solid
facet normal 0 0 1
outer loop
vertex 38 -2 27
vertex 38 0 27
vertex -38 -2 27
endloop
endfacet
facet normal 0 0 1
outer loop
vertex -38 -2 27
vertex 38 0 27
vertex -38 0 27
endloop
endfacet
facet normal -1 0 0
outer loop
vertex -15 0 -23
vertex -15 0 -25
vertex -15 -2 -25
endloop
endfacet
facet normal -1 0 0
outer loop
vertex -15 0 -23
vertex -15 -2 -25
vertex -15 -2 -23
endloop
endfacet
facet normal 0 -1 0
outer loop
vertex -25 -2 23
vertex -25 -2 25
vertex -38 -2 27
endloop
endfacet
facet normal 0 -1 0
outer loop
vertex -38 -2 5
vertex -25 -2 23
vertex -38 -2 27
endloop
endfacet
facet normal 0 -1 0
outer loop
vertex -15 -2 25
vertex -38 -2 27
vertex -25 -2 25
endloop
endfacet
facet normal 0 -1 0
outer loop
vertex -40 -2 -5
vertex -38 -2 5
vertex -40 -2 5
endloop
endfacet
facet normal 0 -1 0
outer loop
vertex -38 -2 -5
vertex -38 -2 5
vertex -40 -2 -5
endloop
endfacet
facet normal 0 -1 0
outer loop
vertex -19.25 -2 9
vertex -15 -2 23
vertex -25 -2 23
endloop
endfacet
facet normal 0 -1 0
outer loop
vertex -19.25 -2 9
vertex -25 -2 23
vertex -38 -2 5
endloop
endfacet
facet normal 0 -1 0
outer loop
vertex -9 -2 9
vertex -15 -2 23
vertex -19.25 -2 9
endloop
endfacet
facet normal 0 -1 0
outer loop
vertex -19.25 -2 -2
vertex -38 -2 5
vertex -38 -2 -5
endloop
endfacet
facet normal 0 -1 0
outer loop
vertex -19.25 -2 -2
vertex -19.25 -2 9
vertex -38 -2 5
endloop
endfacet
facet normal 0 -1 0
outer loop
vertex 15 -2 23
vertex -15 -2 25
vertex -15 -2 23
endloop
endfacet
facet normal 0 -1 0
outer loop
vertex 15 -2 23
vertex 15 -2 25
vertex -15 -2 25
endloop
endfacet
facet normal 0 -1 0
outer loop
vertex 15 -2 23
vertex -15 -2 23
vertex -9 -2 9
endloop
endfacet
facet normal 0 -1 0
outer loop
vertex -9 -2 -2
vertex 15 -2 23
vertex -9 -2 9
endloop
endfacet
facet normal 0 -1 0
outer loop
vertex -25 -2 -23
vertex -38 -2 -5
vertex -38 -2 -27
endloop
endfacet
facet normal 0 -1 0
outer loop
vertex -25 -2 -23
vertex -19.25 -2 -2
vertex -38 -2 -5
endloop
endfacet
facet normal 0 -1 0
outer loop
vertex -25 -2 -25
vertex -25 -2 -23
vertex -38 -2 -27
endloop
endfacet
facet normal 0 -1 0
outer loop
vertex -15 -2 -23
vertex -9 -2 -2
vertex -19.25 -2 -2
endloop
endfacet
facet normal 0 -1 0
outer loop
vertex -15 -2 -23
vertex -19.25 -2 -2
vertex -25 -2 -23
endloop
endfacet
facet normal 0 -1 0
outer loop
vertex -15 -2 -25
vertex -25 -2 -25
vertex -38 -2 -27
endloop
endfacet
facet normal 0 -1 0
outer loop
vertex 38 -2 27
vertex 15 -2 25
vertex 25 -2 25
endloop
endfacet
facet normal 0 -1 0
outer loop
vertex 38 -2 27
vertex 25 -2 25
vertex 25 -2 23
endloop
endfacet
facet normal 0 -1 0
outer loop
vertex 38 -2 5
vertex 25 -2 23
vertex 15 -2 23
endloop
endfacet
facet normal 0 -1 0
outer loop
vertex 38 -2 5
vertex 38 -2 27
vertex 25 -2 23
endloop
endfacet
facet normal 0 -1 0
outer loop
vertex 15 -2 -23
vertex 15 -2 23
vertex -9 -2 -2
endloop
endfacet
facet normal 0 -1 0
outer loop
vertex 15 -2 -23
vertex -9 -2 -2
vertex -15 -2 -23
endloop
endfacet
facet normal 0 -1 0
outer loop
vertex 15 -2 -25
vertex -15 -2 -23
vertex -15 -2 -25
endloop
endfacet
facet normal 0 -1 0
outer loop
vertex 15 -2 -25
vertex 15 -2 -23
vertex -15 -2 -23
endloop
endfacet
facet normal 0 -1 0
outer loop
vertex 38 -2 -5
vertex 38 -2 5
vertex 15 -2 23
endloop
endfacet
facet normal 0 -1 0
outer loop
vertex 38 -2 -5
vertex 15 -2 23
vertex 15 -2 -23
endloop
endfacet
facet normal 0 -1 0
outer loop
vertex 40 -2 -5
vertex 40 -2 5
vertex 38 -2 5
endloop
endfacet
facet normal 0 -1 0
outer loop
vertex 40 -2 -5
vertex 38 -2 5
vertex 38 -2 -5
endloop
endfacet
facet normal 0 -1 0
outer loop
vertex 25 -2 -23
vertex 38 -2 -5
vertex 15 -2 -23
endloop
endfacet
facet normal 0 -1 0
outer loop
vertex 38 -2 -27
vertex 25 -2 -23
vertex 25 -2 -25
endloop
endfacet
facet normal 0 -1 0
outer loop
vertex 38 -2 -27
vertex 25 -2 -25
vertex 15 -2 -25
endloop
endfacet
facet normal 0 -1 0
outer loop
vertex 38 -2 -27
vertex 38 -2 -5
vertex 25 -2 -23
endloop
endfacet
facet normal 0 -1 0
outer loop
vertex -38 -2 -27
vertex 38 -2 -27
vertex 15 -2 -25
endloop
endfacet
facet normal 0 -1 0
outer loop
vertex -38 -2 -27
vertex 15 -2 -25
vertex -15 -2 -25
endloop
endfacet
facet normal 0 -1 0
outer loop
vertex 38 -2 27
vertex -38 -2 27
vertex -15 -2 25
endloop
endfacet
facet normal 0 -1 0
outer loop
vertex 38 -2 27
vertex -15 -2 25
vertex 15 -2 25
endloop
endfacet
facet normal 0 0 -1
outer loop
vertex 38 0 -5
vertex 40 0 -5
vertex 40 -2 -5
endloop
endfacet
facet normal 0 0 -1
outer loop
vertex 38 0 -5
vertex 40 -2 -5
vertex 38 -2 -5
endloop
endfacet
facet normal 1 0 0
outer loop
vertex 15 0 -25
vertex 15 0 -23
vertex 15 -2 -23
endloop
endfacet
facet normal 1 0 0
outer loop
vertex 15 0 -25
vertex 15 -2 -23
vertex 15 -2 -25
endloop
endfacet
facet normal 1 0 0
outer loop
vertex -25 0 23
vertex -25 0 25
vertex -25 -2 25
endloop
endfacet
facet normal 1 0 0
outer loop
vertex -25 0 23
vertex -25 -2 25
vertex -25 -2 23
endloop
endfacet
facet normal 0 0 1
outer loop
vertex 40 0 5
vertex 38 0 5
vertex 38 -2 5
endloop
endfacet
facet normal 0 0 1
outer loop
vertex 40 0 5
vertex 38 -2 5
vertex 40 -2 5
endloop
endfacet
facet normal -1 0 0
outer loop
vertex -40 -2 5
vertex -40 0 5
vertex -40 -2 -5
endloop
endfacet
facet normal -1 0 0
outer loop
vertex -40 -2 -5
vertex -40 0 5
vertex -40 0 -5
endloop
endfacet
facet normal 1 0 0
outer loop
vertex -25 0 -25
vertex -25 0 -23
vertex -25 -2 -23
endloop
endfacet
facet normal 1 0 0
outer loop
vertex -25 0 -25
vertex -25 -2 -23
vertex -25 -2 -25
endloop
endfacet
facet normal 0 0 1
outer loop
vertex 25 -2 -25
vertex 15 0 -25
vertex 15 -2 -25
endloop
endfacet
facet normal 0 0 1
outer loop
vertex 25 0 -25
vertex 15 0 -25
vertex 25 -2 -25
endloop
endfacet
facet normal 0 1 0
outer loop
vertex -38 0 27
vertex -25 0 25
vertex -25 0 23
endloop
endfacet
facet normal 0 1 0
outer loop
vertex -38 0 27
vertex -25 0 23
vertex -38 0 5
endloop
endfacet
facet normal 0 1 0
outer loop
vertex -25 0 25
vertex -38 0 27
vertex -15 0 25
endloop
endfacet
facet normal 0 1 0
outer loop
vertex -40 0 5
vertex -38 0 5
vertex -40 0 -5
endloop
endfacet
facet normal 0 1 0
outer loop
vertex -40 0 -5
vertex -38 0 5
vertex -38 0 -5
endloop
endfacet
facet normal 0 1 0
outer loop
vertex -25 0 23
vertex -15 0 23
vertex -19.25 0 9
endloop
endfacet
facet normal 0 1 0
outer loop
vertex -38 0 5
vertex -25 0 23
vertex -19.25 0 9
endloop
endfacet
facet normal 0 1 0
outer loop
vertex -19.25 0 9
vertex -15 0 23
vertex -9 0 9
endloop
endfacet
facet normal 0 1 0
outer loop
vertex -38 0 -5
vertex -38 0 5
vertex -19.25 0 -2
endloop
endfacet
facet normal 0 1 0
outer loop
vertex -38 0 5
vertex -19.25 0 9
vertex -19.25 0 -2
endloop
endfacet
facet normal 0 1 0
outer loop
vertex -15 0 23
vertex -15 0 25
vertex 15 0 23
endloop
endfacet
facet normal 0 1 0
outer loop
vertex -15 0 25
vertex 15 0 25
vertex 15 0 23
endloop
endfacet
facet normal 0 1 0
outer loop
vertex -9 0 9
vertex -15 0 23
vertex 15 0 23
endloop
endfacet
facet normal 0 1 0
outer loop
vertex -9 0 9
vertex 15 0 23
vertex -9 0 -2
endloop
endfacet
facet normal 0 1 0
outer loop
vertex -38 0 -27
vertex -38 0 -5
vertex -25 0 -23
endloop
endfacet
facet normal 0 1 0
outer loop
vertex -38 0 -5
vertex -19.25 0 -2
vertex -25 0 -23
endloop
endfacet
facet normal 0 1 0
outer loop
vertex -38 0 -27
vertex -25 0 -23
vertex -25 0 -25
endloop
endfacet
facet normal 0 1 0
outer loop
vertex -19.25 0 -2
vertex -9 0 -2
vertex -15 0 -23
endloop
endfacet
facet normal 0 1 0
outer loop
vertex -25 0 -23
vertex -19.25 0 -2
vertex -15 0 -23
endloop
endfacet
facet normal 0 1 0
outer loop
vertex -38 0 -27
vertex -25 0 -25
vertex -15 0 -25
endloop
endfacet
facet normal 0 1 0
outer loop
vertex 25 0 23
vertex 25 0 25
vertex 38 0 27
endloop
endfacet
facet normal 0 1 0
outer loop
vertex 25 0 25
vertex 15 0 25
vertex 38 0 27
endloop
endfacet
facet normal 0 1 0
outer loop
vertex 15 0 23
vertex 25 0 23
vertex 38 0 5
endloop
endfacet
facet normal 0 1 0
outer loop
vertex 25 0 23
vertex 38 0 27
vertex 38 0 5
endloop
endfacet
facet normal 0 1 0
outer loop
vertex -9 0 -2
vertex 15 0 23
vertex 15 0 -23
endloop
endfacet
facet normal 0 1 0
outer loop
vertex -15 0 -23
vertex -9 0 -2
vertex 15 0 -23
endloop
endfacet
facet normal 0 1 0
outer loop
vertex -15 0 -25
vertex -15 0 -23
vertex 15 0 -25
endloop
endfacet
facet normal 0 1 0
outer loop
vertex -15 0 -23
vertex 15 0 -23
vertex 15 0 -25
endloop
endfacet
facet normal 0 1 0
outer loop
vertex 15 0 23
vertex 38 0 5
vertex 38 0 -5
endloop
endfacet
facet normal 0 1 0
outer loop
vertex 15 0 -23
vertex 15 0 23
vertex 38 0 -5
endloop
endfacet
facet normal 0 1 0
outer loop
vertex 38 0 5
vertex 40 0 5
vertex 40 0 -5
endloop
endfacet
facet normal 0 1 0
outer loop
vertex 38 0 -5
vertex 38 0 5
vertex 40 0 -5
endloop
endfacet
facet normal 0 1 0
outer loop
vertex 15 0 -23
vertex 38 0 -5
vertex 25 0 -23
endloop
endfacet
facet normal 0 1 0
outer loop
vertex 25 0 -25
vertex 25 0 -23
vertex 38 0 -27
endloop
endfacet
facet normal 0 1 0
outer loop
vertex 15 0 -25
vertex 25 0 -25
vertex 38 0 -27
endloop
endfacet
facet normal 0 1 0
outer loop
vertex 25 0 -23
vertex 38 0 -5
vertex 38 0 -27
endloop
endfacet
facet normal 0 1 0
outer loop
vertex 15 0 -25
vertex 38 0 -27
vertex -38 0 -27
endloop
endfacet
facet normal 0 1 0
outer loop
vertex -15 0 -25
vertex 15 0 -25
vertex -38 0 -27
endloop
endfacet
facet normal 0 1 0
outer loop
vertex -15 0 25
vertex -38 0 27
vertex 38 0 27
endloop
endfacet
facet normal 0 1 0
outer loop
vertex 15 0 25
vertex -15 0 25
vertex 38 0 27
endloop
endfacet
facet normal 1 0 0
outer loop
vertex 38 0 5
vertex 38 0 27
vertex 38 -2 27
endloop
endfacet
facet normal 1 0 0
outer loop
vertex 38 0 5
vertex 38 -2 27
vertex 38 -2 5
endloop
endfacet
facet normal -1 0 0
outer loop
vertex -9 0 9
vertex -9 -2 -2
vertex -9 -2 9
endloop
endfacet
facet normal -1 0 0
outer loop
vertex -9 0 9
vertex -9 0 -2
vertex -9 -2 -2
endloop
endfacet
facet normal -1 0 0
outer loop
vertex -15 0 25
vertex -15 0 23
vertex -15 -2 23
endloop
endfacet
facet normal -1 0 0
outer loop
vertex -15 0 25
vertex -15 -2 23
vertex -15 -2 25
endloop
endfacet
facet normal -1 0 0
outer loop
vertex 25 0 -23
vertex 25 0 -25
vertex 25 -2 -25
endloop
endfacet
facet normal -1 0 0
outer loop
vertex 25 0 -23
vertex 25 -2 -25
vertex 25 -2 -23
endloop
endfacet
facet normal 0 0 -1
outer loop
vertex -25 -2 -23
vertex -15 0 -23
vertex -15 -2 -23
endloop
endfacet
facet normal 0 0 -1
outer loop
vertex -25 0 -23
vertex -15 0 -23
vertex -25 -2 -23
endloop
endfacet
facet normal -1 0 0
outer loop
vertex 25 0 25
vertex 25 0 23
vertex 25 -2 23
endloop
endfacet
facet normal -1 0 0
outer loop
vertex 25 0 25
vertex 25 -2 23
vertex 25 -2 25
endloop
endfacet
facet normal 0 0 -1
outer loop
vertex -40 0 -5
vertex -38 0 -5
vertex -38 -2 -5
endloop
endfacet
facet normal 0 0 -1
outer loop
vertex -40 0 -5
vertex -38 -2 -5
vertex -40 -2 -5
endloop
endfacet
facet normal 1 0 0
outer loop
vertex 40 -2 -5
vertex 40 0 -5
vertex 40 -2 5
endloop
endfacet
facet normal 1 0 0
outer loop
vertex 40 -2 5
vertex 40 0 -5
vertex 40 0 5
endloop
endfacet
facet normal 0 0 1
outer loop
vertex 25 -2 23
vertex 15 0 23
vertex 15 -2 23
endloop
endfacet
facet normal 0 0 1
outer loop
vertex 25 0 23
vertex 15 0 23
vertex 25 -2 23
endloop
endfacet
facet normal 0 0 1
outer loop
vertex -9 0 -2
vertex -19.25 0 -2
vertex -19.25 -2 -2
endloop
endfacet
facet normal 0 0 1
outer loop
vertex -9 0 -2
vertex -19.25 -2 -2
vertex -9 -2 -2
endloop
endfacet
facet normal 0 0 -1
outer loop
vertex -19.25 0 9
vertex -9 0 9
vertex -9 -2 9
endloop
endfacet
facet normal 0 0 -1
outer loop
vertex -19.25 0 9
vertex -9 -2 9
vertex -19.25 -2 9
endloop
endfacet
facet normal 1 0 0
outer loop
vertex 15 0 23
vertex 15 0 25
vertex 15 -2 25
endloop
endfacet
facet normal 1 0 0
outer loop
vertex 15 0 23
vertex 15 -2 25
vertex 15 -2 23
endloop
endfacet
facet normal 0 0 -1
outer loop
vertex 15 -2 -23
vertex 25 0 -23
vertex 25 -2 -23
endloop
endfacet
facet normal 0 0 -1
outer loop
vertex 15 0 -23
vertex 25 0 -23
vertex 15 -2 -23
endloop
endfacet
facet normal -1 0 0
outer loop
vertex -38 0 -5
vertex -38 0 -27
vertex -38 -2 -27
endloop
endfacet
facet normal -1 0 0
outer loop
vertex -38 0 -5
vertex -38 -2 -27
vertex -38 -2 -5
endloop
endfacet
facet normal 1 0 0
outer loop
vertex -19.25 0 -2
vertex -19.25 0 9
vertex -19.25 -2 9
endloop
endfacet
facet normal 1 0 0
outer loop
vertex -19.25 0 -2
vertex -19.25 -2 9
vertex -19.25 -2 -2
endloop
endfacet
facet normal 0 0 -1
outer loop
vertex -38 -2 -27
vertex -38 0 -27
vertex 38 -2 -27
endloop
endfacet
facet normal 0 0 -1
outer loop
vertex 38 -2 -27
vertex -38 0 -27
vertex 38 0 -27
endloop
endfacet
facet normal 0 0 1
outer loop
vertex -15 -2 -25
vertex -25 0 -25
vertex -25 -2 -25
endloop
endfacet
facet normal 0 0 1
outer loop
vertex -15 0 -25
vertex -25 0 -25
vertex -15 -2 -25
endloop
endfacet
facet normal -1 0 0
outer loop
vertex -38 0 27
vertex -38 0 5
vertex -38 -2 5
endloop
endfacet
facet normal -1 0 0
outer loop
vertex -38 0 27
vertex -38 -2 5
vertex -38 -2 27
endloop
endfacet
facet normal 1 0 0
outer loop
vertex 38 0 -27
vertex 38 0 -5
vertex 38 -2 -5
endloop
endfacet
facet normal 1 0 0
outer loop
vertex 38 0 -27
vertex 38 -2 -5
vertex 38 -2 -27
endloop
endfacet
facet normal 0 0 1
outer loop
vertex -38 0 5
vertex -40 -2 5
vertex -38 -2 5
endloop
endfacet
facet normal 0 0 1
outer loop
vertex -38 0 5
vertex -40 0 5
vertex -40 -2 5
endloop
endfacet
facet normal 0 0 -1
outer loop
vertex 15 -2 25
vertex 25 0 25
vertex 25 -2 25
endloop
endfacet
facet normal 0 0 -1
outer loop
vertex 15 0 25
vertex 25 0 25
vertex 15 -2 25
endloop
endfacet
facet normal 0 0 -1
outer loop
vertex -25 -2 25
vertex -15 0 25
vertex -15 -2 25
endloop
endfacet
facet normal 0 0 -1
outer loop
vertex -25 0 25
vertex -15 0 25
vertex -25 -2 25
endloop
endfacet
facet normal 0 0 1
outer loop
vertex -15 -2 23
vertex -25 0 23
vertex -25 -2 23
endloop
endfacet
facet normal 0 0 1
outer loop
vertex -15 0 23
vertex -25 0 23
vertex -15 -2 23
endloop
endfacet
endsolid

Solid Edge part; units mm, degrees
sketch "Sketch1" plane through (0, 0, 0) normal (0, -1, 0) x (1, 0, 0)
  line L0 (40, -27) -> (40, 27)
  line L1 (40, 27) -> (-40, 27)
  line L2 (-40, 27) -> (-40, -27)
  line L3 (-40, -27) -> (40, -27)
extrude "Protrusion1" add sketch "Sketch1" along normal blind 2
sketch "Sketch2" plane through (0, 0, 0) normal (0, -1, 0) x (1, 0, 0)
  line L0 (-25, 23) -> (-15, 23)
  line L1 (-15, 23) -> (-15, 25)
  line L2 (-15, 25) -> (-25, 25)
  line L3 (-25, 25) -> (-25, 23)
extrude "ExtrudedCutout_1" cut sketch "Sketch2" along normal blind 2
sketch "Sketch3" plane through (0, 0, 0) normal (0, -1, 0) x (1, 0, 0)
  line L0 (25, 25) -> (15, 25)
  line L1 (15, 25) -> (15, 23)
  line L2 (15, 23) -> (25, 23)
  line L3 (25, 23) -> (25, 25)
extrude "ExtrudedCutout_2" cut sketch "Sketch3" along normal blind 2
sketch "Sketch4" plane through (0, 0, 0) normal (0, -1, 0) x (1, 0, 0)
  line L0 (15, -25) -> (25, -25)
  line L1 (25, -25) -> (25, -23)
  line L2 (25, -23) -> (15, -23)
  line L3 (15, -23) -> (15, -25)
extrude "ExtrudedCutout_3" cut sketch "Sketch4" along normal blind 2
sketch "Sketch5" plane through (0, 0, 0) normal (0, -1, 0) x (1, 0, 0)
  line L0 (-15, -23) -> (-25, -23)
  line L1 (-25, -23) -> (-25, -25)
  line L2 (-25, -25) -> (-15, -25)
  line L3 (-15, -25) -> (-15, -23)
extrude "ExtrudedCutout_4" cut sketch "Sketch5" along normal blind 2
sketch "Sketch6" plane through (0, 0, 0) normal (0, -1, 0) x (1, 0, 0)
  line L0 (-38, -27) -> (-38, -5)
  line L1 (-38, -5) -> (-40, -5)
  line L2 (-40, -5) -> (-40, -27)
  line L3 (-40, -27) -> (-38, -27)
extrude "ExtrudedCutout_5" cut sketch "Sketch6" along normal blind 2
sketch "Sketch7" plane through (0, 0, 0) normal (0, -1, 0) x (1, 0, 0)
  line L0 (-38, 5) -> (-38, 27)
  line L1 (-38, 27) -> (-40, 27)
  line L2 (-40, 27) -> (-40, 5)
  line L3 (-40, 5) -> (-38, 5)
extrude "ExtrudedCutout_6" cut sketch "Sketch7" along normal blind 2
sketch "Sketch8" plane through (0, 0, 0) normal (0, -1, 0) x (1, 0, 0)
  line L0 (38, -5) -> (38, -27)
  line L1 (38, -27) -> (40, -27)
  line L2 (40, -27) -> (40, -5)
  line L3 (40, -5) -> (38, -5)
extrude "ExtrudedCutout_7" cut sketch "Sketch8" along normal blind 2
sketch "Sketch9" plane through (0, 0, 0) normal (0, -1, 0) x (1, 0, 0)
  line L0 (38, 27) -> (38, 5)
  line L1 (38, 5) -> (40, 5)
  line L2 (40, 5) -> (40, 27)
  line L3 (40, 27) -> (38, 27)
extrude "ExtrudedCutout_8" cut sketch "Sketch9" along normal blind 2
sketch "Sketch10" plane through (0, 0, 0) normal (0, -1, 0) x (1, 0, 0)
  line L0 (-19.25, -2) -> (-9, -2)
  line L1 (-9, -2) -> (-9, 9)
  line L2 (-9, 9) -> (-19.25, 9)
  line L3 (-19.25, 9) -> (-19.25, -2)
extrude "ExtrudedCutout_9" cut sketch "Sketch10" along normal blind 2
properties material "Acrylic, high impact grade"
